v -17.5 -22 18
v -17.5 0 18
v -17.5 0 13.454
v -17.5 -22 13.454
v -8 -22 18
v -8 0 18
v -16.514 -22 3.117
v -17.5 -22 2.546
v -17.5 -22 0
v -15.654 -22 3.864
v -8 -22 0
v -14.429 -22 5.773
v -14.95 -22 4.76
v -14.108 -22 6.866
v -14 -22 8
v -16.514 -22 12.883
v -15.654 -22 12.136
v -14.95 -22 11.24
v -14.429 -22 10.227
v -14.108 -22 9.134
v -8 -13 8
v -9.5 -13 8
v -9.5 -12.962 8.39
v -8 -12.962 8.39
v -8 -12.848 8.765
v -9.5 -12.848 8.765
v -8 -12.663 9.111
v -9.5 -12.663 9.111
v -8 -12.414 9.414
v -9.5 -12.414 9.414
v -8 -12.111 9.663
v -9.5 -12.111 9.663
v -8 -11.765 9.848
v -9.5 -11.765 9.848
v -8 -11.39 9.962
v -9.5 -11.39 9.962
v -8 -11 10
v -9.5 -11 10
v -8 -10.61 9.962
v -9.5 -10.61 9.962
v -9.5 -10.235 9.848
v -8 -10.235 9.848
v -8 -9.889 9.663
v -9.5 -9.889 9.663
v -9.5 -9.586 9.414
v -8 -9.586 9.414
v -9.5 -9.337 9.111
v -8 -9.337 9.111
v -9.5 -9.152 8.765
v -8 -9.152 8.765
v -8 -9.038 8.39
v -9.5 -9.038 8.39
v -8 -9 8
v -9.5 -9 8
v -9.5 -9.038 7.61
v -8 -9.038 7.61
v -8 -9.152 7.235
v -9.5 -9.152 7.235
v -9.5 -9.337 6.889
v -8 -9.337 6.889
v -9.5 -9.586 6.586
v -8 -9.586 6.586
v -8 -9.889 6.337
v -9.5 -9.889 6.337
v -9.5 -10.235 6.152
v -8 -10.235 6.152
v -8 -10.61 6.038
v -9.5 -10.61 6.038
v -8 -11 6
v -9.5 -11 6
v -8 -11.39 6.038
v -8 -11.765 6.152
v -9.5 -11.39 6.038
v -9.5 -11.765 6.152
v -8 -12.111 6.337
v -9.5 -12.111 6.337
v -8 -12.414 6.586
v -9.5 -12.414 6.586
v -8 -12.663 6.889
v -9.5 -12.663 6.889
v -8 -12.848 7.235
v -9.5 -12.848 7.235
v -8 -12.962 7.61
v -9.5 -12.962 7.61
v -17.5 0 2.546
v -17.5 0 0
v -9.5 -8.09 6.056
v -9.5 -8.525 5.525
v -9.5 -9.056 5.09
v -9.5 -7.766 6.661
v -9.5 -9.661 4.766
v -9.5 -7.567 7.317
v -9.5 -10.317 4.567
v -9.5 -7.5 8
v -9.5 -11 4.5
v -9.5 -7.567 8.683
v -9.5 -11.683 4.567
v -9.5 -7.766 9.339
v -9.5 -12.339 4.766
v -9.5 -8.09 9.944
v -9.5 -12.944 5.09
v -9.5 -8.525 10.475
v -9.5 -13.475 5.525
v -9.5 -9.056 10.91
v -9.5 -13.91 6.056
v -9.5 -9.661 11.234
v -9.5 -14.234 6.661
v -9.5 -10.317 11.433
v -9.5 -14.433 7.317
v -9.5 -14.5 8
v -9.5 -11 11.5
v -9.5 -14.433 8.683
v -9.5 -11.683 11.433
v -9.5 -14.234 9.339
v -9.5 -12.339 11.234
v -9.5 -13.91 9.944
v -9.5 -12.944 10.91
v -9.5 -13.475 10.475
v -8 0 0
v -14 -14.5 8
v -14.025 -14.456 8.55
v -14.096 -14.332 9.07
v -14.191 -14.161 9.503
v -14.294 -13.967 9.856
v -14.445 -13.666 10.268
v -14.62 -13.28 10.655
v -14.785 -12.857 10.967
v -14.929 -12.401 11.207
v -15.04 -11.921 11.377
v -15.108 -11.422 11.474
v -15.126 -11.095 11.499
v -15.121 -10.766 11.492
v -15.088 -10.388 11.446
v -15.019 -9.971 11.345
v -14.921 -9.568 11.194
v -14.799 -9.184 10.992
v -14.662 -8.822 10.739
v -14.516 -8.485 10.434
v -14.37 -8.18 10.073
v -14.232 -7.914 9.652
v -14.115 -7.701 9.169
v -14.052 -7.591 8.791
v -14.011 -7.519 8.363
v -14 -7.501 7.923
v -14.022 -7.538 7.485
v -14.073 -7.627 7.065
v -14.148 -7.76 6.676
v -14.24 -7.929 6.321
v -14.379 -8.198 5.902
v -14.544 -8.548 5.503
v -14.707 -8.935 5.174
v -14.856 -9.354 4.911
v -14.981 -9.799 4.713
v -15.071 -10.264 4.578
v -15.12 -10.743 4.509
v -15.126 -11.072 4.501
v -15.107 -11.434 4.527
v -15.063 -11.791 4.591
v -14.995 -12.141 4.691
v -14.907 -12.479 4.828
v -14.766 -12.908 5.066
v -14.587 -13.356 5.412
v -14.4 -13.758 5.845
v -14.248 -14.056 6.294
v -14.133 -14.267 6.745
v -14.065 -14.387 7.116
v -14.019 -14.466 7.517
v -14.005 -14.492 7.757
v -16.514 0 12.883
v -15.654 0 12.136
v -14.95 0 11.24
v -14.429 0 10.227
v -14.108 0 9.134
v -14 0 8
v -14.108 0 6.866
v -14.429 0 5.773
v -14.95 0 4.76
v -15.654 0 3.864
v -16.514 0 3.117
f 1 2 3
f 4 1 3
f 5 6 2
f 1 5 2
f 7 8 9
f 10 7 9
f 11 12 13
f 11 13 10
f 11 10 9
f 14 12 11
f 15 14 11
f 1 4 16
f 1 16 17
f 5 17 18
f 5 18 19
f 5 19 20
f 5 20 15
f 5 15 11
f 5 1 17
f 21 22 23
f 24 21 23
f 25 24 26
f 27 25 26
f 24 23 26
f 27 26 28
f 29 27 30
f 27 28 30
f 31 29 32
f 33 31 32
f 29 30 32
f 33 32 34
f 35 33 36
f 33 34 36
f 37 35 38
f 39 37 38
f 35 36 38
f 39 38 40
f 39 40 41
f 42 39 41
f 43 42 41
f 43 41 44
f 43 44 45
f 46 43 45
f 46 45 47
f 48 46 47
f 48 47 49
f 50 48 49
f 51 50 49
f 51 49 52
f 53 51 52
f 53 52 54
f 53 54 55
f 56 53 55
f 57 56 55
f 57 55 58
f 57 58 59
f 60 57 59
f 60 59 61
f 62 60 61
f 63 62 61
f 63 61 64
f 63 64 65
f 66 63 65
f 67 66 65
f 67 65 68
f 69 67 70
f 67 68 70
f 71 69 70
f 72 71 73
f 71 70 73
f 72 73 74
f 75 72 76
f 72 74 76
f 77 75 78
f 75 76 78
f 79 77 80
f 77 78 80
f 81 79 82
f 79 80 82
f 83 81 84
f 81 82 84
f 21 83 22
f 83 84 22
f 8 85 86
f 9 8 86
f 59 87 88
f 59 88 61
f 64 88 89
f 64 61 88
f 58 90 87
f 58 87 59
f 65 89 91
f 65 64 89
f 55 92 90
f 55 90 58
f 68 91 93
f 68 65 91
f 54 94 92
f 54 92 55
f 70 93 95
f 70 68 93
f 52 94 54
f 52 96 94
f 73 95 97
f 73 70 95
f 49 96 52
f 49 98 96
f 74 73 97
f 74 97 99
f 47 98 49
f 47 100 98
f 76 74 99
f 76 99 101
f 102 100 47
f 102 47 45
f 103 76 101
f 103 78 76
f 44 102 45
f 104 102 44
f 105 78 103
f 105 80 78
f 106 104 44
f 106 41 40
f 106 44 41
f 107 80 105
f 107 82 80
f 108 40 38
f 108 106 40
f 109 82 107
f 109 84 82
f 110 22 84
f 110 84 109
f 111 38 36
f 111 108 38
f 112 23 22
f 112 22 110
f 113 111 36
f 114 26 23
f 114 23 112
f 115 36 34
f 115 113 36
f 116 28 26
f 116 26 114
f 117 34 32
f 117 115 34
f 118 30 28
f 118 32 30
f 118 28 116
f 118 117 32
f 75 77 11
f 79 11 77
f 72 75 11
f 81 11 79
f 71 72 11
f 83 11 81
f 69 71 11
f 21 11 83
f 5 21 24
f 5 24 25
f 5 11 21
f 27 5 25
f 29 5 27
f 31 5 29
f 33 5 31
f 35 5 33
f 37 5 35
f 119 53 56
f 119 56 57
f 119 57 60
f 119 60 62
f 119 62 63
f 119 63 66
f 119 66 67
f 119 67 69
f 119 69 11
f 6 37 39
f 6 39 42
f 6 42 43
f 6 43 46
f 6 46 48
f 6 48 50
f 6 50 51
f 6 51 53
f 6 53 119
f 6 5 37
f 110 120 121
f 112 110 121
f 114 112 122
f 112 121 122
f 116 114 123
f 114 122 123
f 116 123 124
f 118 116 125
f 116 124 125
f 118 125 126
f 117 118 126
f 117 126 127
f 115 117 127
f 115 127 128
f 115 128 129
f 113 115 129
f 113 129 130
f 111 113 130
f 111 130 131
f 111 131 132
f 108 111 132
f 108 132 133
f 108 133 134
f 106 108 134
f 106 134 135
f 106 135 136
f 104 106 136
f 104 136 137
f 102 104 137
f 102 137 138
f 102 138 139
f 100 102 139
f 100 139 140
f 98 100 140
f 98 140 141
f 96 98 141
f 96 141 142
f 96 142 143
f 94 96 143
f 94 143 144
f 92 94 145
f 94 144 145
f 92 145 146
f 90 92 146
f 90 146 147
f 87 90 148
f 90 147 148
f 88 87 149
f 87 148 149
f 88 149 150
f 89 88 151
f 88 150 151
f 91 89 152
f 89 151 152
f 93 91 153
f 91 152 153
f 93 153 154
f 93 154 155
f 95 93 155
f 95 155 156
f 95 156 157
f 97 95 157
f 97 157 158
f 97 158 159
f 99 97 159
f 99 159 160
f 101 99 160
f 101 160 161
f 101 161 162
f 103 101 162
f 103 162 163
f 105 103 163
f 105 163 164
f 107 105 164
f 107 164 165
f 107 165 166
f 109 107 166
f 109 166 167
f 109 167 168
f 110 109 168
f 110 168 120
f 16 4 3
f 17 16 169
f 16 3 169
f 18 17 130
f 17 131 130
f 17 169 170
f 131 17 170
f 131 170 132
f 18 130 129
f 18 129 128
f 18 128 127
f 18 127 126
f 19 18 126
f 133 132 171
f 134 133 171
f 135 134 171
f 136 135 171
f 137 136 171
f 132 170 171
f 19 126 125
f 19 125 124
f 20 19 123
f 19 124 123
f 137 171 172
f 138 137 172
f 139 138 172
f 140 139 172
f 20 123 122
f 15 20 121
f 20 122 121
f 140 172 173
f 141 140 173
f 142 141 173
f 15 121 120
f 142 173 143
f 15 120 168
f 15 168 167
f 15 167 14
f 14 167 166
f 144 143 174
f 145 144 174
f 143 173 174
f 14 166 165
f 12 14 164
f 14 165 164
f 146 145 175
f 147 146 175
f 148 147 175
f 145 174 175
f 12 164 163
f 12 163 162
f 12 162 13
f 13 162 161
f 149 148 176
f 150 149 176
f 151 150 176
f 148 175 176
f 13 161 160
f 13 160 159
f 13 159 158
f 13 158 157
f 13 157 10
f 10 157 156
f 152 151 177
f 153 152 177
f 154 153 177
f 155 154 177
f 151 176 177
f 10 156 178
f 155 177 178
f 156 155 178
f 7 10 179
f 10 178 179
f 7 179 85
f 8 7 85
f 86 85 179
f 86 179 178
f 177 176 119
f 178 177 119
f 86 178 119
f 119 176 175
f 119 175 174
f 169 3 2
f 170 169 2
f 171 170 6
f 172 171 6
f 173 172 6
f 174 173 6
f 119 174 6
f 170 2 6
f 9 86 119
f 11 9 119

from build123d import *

# Parameters (mm, degrees)
F1_DEPTH = 22
F2_R     = 2
F3_DEPTH = 25
F5_R     = 3.5
F6_DEPTH = 8
F7_W     = 8
F7_H     = 22
F8_DEPTH = 25


with BuildPart() as f1:
    # F0 (on Front) → F1 (new body)
    with BuildSketch(Plane.XZ):
        with BuildLine():
            Line((0, 18), (-17.5, 18))
            Line((-17.5, 18), (-17.5, 13.4543560573))
            ThreePointArc((-17.5, 13.4543560573), (-14, 8), (-17.5, 2.5456439427))
            Line((-17.5, 2.5456439427), (-17.5, 0))
            Line((-17.5, 0), (0, 0))
            Line((0, 0), (0, 18))
        make_face()
    extrude(amount=F1_DEPTH)

    # F2 (on face) → F3 (cut)
    with BuildSketch(Plane(origin=(-17.5, 0, 0), x_dir=(0, -1, 0), z_dir=(-1, 0, 0))):
        with Locations((11, 8)):
            Circle(F2_R)
    extrude(amount=-F3_DEPTH, mode=Mode.SUBTRACT)

    # F5 (on face) → F6 (cut)
    with BuildSketch(Plane(origin=(-17.5, 0, 0), x_dir=(0, -1, 0), z_dir=(-1, 0, 0))):
        with Locations((11, 8)):
            Circle(F5_R)
    extrude(amount=-F6_DEPTH, mode=Mode.SUBTRACT)

    # F7 (on face) → F8 (cut)
    with BuildSketch(Plane.XY.offset(18)):
        with Locations((-4, -11)):
            Rectangle(F7_W, F7_H)
    extrude(amount=-F8_DEPTH, mode=Mode.SUBTRACT)


solid = f1.part
